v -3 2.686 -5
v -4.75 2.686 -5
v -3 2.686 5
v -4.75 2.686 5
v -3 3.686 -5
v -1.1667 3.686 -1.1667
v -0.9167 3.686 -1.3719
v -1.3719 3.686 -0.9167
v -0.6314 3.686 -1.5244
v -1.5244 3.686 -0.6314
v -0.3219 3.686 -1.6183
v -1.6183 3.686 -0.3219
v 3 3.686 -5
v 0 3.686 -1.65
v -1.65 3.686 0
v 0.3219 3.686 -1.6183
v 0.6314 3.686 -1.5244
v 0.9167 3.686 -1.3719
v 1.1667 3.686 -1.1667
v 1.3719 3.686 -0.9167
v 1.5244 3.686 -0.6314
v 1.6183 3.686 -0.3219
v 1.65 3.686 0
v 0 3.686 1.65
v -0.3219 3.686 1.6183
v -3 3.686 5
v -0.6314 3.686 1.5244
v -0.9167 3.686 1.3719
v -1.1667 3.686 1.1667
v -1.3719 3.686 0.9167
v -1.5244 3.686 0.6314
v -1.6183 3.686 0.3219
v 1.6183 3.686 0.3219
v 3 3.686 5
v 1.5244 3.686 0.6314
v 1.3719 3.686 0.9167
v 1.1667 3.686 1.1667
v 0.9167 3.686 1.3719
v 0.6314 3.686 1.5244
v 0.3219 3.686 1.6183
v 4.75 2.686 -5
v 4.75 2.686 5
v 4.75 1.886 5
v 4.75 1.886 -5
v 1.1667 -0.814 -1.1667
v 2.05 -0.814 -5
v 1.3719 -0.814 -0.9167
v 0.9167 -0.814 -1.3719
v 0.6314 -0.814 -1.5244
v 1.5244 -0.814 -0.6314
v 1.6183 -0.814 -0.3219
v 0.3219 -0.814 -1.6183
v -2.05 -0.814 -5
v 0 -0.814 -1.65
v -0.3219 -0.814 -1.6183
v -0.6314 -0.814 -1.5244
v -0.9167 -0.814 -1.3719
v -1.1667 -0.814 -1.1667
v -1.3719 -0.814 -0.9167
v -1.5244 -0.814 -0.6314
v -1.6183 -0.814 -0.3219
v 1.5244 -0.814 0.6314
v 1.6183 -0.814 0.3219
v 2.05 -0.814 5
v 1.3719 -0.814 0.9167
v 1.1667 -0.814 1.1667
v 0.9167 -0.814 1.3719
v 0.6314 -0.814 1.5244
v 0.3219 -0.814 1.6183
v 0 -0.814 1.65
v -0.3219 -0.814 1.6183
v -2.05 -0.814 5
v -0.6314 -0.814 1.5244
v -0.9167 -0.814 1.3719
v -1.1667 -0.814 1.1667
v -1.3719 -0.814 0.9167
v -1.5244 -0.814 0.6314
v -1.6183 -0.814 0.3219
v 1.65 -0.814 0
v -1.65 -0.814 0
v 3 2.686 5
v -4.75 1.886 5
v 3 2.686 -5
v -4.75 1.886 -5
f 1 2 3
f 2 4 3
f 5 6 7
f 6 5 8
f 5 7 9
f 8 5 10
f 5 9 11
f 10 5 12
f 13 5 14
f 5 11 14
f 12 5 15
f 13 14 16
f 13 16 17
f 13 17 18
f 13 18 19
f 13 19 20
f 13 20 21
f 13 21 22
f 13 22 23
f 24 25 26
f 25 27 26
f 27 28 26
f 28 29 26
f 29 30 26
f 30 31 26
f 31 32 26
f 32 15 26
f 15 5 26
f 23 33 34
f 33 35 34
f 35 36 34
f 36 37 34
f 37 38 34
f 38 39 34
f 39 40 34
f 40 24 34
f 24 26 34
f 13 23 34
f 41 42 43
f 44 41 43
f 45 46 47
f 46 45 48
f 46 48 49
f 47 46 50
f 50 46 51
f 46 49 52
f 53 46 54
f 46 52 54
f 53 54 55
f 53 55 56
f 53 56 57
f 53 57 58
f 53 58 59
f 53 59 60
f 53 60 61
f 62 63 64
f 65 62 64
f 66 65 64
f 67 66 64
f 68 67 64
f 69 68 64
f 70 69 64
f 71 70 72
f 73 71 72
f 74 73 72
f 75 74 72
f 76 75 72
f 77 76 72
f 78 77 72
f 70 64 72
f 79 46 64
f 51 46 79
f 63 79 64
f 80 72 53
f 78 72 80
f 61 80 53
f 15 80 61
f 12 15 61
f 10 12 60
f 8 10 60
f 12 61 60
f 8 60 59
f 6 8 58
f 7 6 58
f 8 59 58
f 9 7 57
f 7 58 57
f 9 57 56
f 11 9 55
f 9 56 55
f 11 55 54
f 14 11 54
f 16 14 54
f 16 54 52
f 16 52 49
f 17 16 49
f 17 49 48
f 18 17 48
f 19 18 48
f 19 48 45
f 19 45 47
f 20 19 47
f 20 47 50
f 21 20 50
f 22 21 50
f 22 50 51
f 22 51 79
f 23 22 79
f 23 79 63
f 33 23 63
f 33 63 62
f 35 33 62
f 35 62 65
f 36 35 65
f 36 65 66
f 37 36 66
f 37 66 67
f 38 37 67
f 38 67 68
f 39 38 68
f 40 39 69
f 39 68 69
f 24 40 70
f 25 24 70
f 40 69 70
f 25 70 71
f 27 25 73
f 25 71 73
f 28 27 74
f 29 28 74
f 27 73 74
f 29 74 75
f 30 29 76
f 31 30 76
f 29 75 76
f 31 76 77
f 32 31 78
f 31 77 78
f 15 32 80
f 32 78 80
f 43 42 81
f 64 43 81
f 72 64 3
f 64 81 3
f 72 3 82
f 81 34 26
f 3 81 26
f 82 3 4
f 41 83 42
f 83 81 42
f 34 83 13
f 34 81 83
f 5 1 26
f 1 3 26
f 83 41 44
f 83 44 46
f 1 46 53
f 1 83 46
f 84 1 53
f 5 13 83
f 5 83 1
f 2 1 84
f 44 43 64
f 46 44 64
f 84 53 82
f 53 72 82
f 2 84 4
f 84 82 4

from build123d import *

# Parameters (mm, degrees)
SKETCH_1_W      = 6
SKETCH_1_H      = 1
EXTRUDE_1_DEPTH = 5
HOLE_WIZARD_0_D = 3.3


with BuildPart() as part:
    # 草图1 → 凸台-拉伸1 (new, symmetric)
    with BuildSketch(Plane.XY):
        Polygon((2.05, -0.813970588), (-2.05, -0.813970588), (-4.75, 1.886029412), (-4.75, 2.686029412), (4.75, 2.686029412), (4.75, 1.886029412), align=None)
        with Locations((0, 3.186029412)):
            Rectangle(SKETCH_1_W, SKETCH_1_H)
    extrude(amount=EXTRUDE_1_DEPTH, both=True)

    # Hole Wizard 0 (through all)
    with Locations(Plane(origin=(0, 3.686029412, 0), x_dir=(1, 0, 0), z_dir=(0, 1, 0))):
        with Locations((0, 0)):
            Hole(HOLE_WIZARD_0_D / 2)


solid = part.part
